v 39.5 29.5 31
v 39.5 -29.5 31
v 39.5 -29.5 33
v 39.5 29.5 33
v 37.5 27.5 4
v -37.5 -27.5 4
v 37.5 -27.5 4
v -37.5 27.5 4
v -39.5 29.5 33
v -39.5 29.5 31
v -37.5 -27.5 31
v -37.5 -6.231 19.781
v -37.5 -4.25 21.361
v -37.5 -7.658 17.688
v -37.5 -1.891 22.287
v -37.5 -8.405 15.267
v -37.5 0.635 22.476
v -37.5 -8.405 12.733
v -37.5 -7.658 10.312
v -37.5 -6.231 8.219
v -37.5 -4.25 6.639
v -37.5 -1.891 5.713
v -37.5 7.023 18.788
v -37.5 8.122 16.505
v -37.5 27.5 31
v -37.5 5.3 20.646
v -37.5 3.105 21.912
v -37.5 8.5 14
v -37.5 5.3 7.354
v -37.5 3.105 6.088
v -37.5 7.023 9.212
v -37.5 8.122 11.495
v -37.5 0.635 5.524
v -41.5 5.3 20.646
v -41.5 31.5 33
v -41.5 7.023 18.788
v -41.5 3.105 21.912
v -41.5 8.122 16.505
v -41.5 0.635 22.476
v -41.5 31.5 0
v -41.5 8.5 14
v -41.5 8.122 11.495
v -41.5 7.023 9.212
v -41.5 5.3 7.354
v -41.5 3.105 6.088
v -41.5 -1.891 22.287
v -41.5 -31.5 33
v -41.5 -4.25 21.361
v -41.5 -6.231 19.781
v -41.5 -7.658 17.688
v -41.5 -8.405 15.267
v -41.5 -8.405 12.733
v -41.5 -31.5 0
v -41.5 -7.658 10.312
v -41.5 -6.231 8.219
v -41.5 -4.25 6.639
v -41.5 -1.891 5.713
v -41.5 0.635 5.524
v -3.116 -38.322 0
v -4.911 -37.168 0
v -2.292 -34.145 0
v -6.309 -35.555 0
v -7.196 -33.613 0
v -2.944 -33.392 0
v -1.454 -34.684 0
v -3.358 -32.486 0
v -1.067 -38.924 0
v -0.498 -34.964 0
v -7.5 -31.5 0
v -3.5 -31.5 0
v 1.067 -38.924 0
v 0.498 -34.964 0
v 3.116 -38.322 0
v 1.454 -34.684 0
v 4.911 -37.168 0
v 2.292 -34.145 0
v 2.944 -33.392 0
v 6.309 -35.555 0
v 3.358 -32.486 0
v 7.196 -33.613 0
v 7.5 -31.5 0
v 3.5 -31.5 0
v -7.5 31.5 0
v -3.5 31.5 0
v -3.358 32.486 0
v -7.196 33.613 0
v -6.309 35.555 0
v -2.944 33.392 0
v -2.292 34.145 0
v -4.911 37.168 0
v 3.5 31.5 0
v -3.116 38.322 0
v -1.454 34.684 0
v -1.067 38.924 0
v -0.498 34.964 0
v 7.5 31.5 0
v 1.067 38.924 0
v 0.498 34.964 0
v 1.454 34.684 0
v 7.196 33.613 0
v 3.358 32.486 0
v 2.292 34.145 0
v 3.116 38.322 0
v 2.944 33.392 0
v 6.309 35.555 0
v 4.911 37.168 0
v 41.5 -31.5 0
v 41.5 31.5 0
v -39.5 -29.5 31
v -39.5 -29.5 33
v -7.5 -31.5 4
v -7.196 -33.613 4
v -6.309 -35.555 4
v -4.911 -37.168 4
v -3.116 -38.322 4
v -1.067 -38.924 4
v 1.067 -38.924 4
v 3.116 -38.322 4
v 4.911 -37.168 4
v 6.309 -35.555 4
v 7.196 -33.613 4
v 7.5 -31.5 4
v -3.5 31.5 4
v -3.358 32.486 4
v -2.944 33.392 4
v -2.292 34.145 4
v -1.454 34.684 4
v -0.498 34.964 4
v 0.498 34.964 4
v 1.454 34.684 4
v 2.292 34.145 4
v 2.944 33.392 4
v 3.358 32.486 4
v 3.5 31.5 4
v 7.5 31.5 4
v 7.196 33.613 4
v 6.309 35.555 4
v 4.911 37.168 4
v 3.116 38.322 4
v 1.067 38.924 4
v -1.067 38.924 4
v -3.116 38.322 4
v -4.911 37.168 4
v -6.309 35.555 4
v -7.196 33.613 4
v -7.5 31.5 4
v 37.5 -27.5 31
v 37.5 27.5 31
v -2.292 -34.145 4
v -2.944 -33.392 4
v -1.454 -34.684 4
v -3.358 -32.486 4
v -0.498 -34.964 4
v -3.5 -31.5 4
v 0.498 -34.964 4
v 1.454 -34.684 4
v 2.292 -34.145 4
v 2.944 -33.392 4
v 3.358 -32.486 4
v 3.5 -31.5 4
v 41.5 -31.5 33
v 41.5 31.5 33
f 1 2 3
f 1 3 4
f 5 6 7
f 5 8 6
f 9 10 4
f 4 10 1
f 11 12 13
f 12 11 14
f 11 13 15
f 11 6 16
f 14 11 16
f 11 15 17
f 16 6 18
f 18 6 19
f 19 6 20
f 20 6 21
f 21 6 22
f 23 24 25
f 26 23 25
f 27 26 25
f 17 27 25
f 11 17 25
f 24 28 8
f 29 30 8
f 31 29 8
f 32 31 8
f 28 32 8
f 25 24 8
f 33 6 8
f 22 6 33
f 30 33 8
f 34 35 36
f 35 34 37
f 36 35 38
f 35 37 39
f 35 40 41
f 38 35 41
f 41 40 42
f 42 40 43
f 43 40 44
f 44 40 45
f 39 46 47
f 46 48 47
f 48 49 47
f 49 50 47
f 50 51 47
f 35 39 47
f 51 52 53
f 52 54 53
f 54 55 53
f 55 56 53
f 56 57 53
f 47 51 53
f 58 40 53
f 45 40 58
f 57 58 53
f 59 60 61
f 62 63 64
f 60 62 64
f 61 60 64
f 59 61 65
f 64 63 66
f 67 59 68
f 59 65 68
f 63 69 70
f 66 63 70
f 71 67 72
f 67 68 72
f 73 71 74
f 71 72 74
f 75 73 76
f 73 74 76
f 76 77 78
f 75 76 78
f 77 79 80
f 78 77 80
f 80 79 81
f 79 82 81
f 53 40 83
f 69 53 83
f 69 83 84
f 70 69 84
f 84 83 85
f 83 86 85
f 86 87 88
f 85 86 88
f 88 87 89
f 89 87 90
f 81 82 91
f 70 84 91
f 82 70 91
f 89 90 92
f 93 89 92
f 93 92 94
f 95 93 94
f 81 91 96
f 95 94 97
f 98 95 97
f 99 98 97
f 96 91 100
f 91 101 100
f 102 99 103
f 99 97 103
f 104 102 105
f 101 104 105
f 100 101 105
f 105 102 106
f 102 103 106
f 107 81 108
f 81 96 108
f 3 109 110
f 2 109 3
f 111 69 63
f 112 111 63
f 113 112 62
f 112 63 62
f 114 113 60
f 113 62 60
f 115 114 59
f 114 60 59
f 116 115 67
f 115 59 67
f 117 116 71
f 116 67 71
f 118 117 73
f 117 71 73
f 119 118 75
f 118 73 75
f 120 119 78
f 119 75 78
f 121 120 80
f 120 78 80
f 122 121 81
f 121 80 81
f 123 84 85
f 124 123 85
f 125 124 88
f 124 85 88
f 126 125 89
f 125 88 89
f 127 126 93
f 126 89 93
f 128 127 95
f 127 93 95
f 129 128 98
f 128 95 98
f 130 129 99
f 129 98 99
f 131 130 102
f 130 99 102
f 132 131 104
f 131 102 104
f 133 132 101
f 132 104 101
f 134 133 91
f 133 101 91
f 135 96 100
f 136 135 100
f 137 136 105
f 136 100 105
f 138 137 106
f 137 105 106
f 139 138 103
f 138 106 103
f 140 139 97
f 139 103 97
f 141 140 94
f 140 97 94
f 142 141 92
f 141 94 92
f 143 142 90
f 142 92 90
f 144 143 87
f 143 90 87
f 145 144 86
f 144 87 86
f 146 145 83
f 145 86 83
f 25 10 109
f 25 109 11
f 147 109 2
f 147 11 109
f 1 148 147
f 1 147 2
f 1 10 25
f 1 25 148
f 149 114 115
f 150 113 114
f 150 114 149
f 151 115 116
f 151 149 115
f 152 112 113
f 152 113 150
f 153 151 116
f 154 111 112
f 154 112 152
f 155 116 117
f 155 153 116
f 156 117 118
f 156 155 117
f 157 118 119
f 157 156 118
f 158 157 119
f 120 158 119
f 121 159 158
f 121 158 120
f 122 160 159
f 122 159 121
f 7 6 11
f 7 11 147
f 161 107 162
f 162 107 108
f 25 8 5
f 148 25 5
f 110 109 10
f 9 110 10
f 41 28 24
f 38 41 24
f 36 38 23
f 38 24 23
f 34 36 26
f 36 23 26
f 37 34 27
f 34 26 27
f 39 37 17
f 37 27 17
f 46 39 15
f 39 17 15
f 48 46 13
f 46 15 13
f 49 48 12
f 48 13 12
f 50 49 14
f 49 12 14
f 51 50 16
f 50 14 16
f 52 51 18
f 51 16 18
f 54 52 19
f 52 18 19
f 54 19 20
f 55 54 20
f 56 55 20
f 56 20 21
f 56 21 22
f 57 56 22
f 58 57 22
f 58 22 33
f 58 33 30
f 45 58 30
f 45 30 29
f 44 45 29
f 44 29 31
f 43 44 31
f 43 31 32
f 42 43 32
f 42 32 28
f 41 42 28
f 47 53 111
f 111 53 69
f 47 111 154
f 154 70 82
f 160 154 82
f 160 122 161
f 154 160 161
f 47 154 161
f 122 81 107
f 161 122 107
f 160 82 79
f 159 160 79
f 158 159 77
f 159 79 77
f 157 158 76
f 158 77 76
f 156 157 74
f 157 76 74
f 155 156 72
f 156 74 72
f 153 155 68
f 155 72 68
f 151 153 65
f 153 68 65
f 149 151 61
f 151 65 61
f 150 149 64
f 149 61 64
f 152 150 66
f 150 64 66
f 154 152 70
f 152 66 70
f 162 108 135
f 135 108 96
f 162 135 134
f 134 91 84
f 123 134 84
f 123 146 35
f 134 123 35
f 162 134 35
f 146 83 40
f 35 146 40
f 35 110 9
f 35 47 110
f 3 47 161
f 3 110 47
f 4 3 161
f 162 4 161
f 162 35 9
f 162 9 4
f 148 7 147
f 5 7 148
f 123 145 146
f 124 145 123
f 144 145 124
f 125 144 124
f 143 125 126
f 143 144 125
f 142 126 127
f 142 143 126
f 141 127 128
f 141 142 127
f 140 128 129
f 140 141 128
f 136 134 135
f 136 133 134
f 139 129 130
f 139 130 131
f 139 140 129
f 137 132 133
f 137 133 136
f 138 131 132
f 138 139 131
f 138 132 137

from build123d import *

# Parameters (mm, degrees)
F0_W     = 79
F0_H     = 59
F0_W_2   = 75
F0_H_2   = 55
F1_DEPTH = 4
F2_DEPTH = 31
F3_DEPTH = 33
F4_R     = 8.5
F5_DEPTH = 41.501


# Not quite as in the source:
# - a feature names something its author has since deleted; it is built from what else it names


with BuildPart() as f1:
    # F0 (on Top) → F1 (new body)
    with BuildSketch(Plane.XY):
        Polygon((41.5, -31.5), (41.5, 31.5), (7.5, 31.5), (3.5, 31.5), (-3.5, 31.5), (-7.5, 31.5), (-41.5, 31.5), (-41.5, -31.5), (-7.5, -31.5), (-3.5, -31.5), (3.5, -31.5), (7.5, -31.5), align=None)
        Rectangle(F0_W, F0_H, mode=Mode.SUBTRACT)
        Rectangle(F0_W, F0_H)
        Rectangle(F0_W_2, F0_H_2, mode=Mode.SUBTRACT)
        Rectangle(F0_W_2, F0_H_2)
        with BuildLine():
            ThreePointArc((-7.5, -31.5), (0, -39), (7.5, -31.5))
            Line((7.5, -31.5), (3.5, -31.5))
            ThreePointArc((3.5, -31.5), (0, -35), (-3.5, -31.5))
            Line((-3.5, -31.5), (-7.5, -31.5))
        make_face()
        with BuildLine():
            Line((3.5, 31.5), (7.5, 31.5))
            ThreePointArc((7.5, 31.5), (0, 39), (-7.5, 31.5))
            Line((-7.5, 31.5), (-3.5, 31.5))
            ThreePointArc((-3.5, 31.5), (0, 35), (3.5, 31.5))
        make_face()
    extrude(amount=F1_DEPTH)

    # F0 (on Top) → F2 (join)
    with BuildSketch(Plane.XY):
        Rectangle(F0_W, F0_H)
        Rectangle(F0_W_2, F0_H_2, mode=Mode.SUBTRACT)
    extrude(amount=F2_DEPTH)

    # F0 (on Top) → F3 (join)
    with BuildSketch(Plane.XY):
        Polygon((41.5, -31.5), (41.5, 31.5), (7.5, 31.5), (3.5, 31.5), (-3.5, 31.5), (-7.5, 31.5), (-41.5, 31.5), (-41.5, -31.5), (-7.5, -31.5), (-3.5, -31.5), (3.5, -31.5), (7.5, -31.5), align=None)
        Rectangle(F0_W, F0_H, mode=Mode.SUBTRACT)
    extrude(amount=F3_DEPTH)

    # F4 (on Right) → F5 (cut, through all)
    with BuildSketch(Plane.YZ):
        with Locations((0, 14)):
            Circle(F4_R)
    extrude(amount=-F5_DEPTH, mode=Mode.SUBTRACT)


solid = f1.part
